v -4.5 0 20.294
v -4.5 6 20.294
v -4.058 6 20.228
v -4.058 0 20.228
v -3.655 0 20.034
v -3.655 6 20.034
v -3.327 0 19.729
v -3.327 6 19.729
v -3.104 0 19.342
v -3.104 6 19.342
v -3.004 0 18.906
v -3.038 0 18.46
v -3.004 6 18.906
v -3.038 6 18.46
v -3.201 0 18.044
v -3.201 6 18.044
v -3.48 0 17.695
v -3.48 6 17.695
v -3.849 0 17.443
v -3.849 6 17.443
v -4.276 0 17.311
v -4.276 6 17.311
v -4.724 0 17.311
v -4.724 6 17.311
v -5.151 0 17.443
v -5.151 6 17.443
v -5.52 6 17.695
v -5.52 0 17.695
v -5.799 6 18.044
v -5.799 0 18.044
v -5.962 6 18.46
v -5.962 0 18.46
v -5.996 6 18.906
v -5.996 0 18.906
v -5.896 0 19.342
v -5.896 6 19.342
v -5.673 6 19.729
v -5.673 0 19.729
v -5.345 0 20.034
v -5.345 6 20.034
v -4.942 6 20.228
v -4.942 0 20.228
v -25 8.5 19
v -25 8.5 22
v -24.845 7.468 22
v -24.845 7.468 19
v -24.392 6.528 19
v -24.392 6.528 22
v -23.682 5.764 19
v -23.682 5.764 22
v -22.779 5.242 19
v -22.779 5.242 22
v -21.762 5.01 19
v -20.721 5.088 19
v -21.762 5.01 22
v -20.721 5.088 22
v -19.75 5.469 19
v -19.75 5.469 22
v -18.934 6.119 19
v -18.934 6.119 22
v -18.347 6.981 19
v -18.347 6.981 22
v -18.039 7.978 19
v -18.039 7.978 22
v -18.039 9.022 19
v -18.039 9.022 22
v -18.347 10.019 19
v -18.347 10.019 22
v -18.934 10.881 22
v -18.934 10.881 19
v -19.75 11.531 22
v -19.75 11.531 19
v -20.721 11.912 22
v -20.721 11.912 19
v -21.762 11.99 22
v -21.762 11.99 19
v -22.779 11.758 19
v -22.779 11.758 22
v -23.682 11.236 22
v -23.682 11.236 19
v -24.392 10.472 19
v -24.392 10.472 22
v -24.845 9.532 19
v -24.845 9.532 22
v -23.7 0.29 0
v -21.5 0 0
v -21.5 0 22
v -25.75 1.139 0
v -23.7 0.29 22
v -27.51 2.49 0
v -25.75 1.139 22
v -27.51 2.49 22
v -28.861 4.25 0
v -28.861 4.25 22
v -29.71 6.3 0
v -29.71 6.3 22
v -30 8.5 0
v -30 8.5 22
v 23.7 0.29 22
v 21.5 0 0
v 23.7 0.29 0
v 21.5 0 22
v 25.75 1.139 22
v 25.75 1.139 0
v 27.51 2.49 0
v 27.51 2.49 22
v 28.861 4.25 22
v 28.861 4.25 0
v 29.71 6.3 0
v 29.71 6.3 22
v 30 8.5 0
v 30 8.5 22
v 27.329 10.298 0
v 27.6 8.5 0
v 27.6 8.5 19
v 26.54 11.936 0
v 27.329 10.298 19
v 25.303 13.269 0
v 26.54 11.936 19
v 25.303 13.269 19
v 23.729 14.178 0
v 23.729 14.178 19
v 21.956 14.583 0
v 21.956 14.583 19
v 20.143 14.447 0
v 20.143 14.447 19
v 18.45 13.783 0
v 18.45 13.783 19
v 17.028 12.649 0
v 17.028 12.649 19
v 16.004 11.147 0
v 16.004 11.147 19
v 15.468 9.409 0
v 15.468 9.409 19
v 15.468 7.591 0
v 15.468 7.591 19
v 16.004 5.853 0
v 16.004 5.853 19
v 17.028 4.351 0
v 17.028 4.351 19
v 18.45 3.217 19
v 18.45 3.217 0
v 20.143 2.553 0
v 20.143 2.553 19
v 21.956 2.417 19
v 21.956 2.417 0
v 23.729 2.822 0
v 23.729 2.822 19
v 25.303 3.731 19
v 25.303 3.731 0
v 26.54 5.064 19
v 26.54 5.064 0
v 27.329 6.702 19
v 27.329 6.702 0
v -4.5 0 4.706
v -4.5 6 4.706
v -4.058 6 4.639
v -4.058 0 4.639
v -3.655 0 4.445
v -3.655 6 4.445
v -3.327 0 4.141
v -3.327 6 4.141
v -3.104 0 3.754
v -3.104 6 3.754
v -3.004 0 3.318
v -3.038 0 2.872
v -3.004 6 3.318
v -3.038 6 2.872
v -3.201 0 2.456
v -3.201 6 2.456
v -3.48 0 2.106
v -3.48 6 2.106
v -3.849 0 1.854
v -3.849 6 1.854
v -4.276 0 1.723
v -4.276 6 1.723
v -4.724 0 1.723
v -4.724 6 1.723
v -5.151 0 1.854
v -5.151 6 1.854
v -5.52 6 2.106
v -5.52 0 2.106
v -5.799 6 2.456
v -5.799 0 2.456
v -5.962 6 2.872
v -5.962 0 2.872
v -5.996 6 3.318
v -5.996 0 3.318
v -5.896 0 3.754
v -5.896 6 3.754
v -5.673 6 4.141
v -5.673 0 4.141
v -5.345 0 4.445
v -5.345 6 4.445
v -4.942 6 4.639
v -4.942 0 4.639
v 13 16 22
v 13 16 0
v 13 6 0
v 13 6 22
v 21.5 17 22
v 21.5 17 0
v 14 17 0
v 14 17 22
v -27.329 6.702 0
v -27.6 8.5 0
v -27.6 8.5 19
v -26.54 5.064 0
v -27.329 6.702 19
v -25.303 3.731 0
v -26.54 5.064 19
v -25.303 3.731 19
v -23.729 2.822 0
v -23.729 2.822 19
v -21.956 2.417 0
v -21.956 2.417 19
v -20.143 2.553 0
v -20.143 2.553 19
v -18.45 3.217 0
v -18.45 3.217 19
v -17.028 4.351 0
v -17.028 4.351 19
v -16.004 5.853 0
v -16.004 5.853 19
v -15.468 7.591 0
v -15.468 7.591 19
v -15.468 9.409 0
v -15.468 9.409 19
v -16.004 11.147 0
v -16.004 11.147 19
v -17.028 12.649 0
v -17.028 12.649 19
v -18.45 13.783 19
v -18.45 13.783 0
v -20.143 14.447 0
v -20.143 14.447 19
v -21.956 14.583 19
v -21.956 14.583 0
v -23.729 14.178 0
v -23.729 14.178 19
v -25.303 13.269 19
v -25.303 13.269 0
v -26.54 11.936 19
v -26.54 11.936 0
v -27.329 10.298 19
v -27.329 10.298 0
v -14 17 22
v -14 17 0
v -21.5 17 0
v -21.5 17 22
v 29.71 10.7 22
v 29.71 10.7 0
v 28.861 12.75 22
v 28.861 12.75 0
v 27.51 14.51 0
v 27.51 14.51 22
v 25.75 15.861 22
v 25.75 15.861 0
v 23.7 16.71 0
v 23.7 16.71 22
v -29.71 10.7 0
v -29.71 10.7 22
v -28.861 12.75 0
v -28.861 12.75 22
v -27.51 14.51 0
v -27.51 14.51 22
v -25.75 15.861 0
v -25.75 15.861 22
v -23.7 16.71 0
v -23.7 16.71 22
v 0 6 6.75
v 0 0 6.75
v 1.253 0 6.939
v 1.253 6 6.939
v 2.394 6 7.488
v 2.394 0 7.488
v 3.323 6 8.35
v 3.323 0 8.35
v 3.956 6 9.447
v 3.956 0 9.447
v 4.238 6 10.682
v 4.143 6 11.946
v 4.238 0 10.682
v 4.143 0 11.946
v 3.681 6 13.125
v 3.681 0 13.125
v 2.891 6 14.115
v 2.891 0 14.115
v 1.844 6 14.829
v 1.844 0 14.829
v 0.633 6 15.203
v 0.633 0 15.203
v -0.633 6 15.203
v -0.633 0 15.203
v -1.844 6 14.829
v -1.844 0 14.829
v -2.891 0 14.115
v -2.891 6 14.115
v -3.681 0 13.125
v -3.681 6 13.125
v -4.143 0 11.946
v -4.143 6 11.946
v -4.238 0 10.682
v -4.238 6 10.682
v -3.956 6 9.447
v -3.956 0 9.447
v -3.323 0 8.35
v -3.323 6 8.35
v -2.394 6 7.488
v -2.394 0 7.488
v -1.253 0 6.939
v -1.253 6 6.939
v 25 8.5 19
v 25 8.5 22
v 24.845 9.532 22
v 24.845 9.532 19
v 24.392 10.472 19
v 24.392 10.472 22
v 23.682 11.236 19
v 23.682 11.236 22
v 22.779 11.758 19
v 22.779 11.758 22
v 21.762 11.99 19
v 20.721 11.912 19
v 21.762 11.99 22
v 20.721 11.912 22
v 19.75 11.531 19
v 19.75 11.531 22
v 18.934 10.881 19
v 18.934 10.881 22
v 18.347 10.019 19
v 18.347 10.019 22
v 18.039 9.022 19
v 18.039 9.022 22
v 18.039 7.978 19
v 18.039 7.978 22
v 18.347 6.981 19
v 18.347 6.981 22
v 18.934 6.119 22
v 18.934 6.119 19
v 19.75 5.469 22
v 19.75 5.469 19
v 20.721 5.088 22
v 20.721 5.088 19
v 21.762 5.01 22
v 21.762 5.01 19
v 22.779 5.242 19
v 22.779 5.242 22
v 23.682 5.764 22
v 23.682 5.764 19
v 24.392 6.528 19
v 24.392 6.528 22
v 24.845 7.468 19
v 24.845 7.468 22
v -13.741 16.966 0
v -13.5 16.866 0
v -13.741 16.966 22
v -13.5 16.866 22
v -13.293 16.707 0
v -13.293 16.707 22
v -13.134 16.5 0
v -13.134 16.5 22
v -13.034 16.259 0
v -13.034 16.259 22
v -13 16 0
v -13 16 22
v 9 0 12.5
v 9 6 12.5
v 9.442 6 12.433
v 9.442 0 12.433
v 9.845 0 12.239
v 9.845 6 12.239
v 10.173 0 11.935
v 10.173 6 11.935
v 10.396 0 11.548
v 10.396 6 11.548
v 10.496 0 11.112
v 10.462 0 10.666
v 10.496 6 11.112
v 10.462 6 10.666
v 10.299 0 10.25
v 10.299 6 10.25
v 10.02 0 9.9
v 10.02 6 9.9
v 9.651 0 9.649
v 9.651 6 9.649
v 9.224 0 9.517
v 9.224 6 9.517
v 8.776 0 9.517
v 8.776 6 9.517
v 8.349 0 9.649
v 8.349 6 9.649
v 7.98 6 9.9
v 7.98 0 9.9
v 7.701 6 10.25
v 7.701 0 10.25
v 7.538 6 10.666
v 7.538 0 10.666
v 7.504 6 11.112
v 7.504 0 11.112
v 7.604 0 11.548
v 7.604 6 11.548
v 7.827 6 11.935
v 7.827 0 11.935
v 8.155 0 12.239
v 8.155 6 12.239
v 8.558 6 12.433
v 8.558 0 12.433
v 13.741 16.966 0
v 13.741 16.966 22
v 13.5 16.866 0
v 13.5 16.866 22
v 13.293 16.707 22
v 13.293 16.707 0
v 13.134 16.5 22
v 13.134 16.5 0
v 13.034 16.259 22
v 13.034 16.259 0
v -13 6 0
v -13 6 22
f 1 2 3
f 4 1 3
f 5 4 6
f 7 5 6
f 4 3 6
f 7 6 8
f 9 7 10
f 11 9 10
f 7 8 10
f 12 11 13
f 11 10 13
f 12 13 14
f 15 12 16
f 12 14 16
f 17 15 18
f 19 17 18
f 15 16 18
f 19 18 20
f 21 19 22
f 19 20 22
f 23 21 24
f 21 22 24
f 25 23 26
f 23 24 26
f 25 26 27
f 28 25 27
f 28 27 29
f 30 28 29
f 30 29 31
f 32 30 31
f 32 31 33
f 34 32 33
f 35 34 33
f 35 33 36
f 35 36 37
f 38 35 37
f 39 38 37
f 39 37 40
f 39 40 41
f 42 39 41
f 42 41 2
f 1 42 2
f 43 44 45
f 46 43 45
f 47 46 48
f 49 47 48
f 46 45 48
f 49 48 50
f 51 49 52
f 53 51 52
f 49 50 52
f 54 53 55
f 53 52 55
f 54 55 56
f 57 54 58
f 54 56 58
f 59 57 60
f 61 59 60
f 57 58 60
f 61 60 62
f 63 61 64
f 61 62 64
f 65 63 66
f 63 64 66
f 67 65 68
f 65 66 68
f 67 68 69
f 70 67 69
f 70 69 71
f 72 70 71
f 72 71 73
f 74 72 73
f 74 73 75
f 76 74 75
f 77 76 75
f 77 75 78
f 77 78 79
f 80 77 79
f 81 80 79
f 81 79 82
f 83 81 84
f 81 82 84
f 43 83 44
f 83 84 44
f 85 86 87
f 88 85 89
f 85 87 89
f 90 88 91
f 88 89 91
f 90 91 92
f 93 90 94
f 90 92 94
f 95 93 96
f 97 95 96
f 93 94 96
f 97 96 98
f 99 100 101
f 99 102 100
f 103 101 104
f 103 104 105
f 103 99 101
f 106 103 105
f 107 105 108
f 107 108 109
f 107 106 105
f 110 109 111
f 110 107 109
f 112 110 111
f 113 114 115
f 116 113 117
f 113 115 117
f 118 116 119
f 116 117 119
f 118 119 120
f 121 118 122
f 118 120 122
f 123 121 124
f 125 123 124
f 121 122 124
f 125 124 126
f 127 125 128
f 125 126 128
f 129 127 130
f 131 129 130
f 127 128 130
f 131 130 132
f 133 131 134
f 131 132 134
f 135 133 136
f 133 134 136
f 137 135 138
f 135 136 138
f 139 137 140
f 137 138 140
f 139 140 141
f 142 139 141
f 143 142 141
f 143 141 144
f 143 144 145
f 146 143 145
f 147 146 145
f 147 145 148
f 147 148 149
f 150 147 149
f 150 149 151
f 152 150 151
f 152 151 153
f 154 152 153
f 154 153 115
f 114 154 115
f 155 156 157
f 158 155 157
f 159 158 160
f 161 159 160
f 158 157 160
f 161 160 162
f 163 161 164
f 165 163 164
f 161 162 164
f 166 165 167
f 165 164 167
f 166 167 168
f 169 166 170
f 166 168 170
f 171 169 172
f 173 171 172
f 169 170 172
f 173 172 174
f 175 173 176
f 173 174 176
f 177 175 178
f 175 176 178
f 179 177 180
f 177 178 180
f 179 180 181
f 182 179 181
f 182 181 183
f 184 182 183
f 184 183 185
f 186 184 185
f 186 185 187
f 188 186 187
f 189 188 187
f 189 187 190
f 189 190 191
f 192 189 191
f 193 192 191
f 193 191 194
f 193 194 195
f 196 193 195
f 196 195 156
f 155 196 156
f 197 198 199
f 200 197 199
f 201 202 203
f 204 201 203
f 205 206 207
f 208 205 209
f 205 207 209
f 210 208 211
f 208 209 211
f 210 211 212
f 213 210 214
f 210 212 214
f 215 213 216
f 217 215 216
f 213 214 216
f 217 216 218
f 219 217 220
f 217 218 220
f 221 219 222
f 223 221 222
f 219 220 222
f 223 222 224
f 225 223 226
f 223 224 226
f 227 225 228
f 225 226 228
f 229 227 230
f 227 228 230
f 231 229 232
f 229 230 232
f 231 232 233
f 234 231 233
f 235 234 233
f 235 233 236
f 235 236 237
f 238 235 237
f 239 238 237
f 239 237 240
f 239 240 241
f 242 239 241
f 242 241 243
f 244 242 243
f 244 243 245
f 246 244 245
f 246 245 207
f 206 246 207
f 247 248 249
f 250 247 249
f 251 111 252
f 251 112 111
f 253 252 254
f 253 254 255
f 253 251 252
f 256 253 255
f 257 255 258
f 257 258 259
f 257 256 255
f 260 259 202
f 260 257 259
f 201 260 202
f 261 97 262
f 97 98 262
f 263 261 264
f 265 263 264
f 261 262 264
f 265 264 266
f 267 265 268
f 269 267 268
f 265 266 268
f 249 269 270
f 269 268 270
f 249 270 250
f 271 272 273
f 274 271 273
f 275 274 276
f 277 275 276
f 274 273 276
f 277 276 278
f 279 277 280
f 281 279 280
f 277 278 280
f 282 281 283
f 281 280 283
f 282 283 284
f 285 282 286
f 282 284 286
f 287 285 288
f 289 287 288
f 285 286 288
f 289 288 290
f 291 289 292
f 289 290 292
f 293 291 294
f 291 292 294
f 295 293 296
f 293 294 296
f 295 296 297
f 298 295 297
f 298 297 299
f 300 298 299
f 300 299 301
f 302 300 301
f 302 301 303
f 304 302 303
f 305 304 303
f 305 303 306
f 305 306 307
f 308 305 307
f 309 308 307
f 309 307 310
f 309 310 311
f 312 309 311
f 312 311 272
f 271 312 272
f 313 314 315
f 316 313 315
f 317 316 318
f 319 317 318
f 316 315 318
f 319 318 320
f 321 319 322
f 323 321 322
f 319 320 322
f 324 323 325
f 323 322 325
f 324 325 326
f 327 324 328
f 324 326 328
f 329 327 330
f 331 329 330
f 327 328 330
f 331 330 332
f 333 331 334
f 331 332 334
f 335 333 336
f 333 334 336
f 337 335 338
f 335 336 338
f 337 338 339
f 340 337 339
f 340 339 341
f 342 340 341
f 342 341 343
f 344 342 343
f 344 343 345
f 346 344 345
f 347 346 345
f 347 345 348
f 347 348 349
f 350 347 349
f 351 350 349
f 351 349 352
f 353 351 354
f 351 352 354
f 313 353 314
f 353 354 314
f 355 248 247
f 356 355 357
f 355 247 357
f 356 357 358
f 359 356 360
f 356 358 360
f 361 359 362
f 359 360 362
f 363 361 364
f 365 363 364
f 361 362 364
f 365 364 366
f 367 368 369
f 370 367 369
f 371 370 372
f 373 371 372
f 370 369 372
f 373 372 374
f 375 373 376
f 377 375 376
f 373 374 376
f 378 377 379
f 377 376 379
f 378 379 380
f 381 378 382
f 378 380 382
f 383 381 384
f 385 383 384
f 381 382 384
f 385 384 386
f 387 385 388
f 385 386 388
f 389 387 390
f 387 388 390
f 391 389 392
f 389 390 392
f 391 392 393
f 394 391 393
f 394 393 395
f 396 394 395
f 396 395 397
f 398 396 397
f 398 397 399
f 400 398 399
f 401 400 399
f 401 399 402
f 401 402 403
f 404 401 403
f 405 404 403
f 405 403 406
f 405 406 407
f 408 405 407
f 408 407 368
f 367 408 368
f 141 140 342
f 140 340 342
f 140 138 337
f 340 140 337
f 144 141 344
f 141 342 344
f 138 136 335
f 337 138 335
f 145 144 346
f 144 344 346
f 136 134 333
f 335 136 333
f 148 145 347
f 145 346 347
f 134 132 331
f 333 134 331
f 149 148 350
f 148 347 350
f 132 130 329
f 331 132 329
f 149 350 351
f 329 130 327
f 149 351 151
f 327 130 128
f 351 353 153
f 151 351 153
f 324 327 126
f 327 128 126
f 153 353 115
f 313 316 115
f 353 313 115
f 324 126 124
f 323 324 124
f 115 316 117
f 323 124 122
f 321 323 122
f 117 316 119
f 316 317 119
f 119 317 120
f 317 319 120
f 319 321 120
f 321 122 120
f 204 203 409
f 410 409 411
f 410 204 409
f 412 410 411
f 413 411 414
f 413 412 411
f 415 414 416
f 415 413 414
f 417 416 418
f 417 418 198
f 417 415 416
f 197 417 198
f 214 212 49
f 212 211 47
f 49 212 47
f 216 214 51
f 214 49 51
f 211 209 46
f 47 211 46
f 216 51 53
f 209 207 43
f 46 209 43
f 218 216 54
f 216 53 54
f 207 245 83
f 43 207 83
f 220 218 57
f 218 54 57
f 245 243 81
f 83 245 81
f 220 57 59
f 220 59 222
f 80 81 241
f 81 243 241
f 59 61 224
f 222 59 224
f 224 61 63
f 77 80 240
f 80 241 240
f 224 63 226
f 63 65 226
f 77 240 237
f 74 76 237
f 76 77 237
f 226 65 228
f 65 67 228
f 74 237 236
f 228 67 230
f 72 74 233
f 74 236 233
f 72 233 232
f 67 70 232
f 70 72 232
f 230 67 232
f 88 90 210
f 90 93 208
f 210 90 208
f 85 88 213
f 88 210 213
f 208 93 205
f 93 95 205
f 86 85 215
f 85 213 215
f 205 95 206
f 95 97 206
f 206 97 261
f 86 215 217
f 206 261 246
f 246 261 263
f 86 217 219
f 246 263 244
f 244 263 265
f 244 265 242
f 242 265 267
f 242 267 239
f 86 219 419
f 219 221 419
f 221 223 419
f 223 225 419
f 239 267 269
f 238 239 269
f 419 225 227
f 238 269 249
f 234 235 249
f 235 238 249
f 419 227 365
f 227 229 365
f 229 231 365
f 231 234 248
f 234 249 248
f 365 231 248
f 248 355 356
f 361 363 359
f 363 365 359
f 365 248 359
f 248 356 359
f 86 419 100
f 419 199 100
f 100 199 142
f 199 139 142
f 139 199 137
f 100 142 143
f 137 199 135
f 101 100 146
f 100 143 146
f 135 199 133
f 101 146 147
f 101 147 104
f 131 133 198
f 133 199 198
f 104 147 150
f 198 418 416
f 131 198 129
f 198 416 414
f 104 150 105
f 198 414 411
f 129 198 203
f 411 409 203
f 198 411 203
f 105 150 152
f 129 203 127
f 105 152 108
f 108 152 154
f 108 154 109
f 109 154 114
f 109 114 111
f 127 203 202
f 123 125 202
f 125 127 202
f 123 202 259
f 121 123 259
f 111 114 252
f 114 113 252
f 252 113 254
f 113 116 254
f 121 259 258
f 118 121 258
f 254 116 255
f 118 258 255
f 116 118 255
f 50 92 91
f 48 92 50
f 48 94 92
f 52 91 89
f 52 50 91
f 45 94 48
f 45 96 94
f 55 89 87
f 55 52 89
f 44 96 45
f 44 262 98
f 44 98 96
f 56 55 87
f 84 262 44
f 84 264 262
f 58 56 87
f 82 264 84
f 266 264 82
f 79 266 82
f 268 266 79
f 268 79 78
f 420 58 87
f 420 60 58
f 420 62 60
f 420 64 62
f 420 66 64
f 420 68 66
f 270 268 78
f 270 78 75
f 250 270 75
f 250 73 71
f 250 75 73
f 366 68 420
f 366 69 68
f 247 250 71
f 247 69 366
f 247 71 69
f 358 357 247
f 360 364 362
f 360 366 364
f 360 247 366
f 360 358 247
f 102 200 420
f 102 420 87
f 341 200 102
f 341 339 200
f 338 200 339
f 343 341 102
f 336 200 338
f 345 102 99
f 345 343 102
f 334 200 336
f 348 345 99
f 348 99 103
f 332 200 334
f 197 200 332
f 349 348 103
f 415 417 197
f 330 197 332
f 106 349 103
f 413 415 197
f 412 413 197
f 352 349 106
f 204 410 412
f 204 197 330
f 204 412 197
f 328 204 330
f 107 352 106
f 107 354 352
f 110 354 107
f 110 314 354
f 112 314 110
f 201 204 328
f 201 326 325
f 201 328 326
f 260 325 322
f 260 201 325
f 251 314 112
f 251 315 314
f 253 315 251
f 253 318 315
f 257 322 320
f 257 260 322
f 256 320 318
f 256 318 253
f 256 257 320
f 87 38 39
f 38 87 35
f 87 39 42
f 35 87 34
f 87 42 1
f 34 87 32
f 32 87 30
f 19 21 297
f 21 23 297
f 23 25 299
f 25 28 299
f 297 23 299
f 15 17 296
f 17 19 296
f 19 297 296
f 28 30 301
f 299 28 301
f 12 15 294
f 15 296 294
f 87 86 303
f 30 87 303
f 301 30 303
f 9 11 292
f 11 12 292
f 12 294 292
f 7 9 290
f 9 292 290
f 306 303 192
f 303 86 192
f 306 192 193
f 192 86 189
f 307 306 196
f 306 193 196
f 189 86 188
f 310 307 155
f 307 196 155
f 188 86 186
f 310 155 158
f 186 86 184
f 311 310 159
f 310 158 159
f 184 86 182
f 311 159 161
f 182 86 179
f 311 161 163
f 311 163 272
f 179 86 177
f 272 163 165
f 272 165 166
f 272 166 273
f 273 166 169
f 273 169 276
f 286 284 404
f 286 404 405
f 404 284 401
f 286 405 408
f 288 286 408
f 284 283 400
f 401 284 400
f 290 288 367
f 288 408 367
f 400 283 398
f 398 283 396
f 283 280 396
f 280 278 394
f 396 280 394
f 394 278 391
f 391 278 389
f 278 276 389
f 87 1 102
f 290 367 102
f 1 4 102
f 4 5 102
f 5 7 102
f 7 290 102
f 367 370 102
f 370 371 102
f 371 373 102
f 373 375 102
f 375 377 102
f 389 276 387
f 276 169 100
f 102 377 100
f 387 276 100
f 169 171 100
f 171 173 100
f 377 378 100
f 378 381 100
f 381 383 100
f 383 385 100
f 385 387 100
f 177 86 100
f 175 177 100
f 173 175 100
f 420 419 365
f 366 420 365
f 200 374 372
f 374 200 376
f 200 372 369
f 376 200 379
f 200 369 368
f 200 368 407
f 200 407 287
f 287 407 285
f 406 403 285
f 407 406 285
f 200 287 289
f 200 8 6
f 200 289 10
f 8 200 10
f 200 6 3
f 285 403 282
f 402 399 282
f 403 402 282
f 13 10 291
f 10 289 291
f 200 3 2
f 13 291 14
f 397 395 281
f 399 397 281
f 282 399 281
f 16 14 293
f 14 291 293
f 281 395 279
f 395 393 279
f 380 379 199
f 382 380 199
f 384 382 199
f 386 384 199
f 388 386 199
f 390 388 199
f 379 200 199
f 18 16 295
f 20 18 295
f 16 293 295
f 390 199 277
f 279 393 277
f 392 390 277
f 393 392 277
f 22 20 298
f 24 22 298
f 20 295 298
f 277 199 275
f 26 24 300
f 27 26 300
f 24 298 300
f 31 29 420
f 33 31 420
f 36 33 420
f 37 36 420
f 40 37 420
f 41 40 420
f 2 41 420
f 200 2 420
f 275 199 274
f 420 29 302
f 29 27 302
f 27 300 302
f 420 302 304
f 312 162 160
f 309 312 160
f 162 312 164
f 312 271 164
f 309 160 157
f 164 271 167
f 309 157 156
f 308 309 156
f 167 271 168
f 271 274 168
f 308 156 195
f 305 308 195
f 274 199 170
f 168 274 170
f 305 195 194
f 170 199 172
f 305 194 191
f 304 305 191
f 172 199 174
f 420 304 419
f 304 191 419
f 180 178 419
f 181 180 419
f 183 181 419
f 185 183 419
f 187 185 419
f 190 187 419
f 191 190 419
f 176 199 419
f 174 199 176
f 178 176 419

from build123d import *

# Parameters (mm, degrees)
BOSS_EXTRU_1_DEPTH      = 22
ESQUISSE3_R             = 6.1
ENL_V_MAT_EXTRU_1_DEPTH = 41.902322672
ESQUISSE4_R             = 4.25
ENL_V_MAT_EXTRU_2_DEPTH = 41.902322672
CONG_1_R                = 8.5
ESQUISSE5_R             = 1.5
ENL_V_MAT_EXTRU_3_DEPTH = 39.794329483
ESQUISSE6_R             = 6.25
ESQUISSE6_R_2           = 3.5
BOSS_EXTRU_2_DEPTH      = 3
CONG_2_R                = 1


with BuildPart() as part:
    # Esquisse2 → Boss.-Extru.1 (new body)
    with BuildSketch(Plane.XY):
        Polygon((-30, 0), (30, 0), (30, 17), (13, 17), (13, 6), (-13, 6), (-13, 17), (-30, 17), align=None)
    extrude(amount=BOSS_EXTRU_1_DEPTH)

    # Esquisse3 → Enlèv. mat.-Extru.1 (cut, through all)
    with BuildSketch(Plane.XY.offset(22)):
        with Locations((21.5, 8.5)):
            Circle(ESQUISSE3_R)
        with Locations(Location((-21.5, 8.5, 0), (0, 0, 180))):
            Circle(ESQUISSE3_R)
    extrude(amount=-ENL_V_MAT_EXTRU_1_DEPTH, mode=Mode.SUBTRACT)

    # Esquisse4 → Enlèv. mat.-Extru.2 (cut, through all)
    with BuildSketch(Plane(origin=(0, 0, 0), x_dir=(-1, 0, 0), z_dir=(0, -1, 0))):
        with Locations(Location((0, -11, 0), (0, 0, 90))):
            Circle(ESQUISSE4_R)
    extrude(amount=-ENL_V_MAT_EXTRU_2_DEPTH, mode=Mode.SUBTRACT)

    # Congé1
    cong_1_edges = [part.edges().sort_by_distance(p)[0] for p in [
        (30, 0, 11),
        (30, 17, 11),
        (-30, 0, 11),
        (-30, 17, 11),
    ]]
    fillet(cong_1_edges, radius=CONG_1_R - 0.0001)  # a hair under: the kernel refuses the full size

    # Esquisse5 → Enlèv. mat.-Extru.3 (cut, through all)
    with BuildSketch(Plane(origin=(0, 6, 0), x_dir=(1, 0, 0), z_dir=(0, 1, 0))):
        with Locations(Location((9, -11, 0), (0, 0, 270))):
            Circle(ESQUISSE5_R)
        with Locations(Location((-4.5, -18.794228634, 0), (0, 0, 270))):
            Circle(ESQUISSE5_R)
        with Locations(Location((-4.5, -3.205771366, 0), (0, 0, 270))):
            Circle(ESQUISSE5_R)
    extrude(amount=-ENL_V_MAT_EXTRU_3_DEPTH, mode=Mode.SUBTRACT)

    # Esquisse6 → Boss.-Extru.2 (add)
    # profile 1 of 2: a face of its own
    with BuildSketch(Plane.XY.offset(22)):
        with Locations((21.5, 8.5)):
            Circle(ESQUISSE6_R)
        with Locations((21.5, 8.5)):
            Circle(ESQUISSE6_R_2, mode=Mode.SUBTRACT)
    # profile 2 of 2: a face of its own
    with BuildSketch(Plane.XY.offset(22)):
        with Locations((-21.5, 8.5)):
            Circle(ESQUISSE6_R)
        with Locations(Location((-21.5, 8.5, 0), (0, 0, 180))):
            Circle(ESQUISSE6_R_2, mode=Mode.SUBTRACT)
    extrude(amount=-BOSS_EXTRU_2_DEPTH)

    # Congé2
    cong_2_edges = [part.edges().sort_by_distance(p)[0] for p in [
        (13, 17, 11),
        (-13, 17, 11),
    ]]
    fillet(cong_2_edges, radius=CONG_2_R)


solid = part.part
